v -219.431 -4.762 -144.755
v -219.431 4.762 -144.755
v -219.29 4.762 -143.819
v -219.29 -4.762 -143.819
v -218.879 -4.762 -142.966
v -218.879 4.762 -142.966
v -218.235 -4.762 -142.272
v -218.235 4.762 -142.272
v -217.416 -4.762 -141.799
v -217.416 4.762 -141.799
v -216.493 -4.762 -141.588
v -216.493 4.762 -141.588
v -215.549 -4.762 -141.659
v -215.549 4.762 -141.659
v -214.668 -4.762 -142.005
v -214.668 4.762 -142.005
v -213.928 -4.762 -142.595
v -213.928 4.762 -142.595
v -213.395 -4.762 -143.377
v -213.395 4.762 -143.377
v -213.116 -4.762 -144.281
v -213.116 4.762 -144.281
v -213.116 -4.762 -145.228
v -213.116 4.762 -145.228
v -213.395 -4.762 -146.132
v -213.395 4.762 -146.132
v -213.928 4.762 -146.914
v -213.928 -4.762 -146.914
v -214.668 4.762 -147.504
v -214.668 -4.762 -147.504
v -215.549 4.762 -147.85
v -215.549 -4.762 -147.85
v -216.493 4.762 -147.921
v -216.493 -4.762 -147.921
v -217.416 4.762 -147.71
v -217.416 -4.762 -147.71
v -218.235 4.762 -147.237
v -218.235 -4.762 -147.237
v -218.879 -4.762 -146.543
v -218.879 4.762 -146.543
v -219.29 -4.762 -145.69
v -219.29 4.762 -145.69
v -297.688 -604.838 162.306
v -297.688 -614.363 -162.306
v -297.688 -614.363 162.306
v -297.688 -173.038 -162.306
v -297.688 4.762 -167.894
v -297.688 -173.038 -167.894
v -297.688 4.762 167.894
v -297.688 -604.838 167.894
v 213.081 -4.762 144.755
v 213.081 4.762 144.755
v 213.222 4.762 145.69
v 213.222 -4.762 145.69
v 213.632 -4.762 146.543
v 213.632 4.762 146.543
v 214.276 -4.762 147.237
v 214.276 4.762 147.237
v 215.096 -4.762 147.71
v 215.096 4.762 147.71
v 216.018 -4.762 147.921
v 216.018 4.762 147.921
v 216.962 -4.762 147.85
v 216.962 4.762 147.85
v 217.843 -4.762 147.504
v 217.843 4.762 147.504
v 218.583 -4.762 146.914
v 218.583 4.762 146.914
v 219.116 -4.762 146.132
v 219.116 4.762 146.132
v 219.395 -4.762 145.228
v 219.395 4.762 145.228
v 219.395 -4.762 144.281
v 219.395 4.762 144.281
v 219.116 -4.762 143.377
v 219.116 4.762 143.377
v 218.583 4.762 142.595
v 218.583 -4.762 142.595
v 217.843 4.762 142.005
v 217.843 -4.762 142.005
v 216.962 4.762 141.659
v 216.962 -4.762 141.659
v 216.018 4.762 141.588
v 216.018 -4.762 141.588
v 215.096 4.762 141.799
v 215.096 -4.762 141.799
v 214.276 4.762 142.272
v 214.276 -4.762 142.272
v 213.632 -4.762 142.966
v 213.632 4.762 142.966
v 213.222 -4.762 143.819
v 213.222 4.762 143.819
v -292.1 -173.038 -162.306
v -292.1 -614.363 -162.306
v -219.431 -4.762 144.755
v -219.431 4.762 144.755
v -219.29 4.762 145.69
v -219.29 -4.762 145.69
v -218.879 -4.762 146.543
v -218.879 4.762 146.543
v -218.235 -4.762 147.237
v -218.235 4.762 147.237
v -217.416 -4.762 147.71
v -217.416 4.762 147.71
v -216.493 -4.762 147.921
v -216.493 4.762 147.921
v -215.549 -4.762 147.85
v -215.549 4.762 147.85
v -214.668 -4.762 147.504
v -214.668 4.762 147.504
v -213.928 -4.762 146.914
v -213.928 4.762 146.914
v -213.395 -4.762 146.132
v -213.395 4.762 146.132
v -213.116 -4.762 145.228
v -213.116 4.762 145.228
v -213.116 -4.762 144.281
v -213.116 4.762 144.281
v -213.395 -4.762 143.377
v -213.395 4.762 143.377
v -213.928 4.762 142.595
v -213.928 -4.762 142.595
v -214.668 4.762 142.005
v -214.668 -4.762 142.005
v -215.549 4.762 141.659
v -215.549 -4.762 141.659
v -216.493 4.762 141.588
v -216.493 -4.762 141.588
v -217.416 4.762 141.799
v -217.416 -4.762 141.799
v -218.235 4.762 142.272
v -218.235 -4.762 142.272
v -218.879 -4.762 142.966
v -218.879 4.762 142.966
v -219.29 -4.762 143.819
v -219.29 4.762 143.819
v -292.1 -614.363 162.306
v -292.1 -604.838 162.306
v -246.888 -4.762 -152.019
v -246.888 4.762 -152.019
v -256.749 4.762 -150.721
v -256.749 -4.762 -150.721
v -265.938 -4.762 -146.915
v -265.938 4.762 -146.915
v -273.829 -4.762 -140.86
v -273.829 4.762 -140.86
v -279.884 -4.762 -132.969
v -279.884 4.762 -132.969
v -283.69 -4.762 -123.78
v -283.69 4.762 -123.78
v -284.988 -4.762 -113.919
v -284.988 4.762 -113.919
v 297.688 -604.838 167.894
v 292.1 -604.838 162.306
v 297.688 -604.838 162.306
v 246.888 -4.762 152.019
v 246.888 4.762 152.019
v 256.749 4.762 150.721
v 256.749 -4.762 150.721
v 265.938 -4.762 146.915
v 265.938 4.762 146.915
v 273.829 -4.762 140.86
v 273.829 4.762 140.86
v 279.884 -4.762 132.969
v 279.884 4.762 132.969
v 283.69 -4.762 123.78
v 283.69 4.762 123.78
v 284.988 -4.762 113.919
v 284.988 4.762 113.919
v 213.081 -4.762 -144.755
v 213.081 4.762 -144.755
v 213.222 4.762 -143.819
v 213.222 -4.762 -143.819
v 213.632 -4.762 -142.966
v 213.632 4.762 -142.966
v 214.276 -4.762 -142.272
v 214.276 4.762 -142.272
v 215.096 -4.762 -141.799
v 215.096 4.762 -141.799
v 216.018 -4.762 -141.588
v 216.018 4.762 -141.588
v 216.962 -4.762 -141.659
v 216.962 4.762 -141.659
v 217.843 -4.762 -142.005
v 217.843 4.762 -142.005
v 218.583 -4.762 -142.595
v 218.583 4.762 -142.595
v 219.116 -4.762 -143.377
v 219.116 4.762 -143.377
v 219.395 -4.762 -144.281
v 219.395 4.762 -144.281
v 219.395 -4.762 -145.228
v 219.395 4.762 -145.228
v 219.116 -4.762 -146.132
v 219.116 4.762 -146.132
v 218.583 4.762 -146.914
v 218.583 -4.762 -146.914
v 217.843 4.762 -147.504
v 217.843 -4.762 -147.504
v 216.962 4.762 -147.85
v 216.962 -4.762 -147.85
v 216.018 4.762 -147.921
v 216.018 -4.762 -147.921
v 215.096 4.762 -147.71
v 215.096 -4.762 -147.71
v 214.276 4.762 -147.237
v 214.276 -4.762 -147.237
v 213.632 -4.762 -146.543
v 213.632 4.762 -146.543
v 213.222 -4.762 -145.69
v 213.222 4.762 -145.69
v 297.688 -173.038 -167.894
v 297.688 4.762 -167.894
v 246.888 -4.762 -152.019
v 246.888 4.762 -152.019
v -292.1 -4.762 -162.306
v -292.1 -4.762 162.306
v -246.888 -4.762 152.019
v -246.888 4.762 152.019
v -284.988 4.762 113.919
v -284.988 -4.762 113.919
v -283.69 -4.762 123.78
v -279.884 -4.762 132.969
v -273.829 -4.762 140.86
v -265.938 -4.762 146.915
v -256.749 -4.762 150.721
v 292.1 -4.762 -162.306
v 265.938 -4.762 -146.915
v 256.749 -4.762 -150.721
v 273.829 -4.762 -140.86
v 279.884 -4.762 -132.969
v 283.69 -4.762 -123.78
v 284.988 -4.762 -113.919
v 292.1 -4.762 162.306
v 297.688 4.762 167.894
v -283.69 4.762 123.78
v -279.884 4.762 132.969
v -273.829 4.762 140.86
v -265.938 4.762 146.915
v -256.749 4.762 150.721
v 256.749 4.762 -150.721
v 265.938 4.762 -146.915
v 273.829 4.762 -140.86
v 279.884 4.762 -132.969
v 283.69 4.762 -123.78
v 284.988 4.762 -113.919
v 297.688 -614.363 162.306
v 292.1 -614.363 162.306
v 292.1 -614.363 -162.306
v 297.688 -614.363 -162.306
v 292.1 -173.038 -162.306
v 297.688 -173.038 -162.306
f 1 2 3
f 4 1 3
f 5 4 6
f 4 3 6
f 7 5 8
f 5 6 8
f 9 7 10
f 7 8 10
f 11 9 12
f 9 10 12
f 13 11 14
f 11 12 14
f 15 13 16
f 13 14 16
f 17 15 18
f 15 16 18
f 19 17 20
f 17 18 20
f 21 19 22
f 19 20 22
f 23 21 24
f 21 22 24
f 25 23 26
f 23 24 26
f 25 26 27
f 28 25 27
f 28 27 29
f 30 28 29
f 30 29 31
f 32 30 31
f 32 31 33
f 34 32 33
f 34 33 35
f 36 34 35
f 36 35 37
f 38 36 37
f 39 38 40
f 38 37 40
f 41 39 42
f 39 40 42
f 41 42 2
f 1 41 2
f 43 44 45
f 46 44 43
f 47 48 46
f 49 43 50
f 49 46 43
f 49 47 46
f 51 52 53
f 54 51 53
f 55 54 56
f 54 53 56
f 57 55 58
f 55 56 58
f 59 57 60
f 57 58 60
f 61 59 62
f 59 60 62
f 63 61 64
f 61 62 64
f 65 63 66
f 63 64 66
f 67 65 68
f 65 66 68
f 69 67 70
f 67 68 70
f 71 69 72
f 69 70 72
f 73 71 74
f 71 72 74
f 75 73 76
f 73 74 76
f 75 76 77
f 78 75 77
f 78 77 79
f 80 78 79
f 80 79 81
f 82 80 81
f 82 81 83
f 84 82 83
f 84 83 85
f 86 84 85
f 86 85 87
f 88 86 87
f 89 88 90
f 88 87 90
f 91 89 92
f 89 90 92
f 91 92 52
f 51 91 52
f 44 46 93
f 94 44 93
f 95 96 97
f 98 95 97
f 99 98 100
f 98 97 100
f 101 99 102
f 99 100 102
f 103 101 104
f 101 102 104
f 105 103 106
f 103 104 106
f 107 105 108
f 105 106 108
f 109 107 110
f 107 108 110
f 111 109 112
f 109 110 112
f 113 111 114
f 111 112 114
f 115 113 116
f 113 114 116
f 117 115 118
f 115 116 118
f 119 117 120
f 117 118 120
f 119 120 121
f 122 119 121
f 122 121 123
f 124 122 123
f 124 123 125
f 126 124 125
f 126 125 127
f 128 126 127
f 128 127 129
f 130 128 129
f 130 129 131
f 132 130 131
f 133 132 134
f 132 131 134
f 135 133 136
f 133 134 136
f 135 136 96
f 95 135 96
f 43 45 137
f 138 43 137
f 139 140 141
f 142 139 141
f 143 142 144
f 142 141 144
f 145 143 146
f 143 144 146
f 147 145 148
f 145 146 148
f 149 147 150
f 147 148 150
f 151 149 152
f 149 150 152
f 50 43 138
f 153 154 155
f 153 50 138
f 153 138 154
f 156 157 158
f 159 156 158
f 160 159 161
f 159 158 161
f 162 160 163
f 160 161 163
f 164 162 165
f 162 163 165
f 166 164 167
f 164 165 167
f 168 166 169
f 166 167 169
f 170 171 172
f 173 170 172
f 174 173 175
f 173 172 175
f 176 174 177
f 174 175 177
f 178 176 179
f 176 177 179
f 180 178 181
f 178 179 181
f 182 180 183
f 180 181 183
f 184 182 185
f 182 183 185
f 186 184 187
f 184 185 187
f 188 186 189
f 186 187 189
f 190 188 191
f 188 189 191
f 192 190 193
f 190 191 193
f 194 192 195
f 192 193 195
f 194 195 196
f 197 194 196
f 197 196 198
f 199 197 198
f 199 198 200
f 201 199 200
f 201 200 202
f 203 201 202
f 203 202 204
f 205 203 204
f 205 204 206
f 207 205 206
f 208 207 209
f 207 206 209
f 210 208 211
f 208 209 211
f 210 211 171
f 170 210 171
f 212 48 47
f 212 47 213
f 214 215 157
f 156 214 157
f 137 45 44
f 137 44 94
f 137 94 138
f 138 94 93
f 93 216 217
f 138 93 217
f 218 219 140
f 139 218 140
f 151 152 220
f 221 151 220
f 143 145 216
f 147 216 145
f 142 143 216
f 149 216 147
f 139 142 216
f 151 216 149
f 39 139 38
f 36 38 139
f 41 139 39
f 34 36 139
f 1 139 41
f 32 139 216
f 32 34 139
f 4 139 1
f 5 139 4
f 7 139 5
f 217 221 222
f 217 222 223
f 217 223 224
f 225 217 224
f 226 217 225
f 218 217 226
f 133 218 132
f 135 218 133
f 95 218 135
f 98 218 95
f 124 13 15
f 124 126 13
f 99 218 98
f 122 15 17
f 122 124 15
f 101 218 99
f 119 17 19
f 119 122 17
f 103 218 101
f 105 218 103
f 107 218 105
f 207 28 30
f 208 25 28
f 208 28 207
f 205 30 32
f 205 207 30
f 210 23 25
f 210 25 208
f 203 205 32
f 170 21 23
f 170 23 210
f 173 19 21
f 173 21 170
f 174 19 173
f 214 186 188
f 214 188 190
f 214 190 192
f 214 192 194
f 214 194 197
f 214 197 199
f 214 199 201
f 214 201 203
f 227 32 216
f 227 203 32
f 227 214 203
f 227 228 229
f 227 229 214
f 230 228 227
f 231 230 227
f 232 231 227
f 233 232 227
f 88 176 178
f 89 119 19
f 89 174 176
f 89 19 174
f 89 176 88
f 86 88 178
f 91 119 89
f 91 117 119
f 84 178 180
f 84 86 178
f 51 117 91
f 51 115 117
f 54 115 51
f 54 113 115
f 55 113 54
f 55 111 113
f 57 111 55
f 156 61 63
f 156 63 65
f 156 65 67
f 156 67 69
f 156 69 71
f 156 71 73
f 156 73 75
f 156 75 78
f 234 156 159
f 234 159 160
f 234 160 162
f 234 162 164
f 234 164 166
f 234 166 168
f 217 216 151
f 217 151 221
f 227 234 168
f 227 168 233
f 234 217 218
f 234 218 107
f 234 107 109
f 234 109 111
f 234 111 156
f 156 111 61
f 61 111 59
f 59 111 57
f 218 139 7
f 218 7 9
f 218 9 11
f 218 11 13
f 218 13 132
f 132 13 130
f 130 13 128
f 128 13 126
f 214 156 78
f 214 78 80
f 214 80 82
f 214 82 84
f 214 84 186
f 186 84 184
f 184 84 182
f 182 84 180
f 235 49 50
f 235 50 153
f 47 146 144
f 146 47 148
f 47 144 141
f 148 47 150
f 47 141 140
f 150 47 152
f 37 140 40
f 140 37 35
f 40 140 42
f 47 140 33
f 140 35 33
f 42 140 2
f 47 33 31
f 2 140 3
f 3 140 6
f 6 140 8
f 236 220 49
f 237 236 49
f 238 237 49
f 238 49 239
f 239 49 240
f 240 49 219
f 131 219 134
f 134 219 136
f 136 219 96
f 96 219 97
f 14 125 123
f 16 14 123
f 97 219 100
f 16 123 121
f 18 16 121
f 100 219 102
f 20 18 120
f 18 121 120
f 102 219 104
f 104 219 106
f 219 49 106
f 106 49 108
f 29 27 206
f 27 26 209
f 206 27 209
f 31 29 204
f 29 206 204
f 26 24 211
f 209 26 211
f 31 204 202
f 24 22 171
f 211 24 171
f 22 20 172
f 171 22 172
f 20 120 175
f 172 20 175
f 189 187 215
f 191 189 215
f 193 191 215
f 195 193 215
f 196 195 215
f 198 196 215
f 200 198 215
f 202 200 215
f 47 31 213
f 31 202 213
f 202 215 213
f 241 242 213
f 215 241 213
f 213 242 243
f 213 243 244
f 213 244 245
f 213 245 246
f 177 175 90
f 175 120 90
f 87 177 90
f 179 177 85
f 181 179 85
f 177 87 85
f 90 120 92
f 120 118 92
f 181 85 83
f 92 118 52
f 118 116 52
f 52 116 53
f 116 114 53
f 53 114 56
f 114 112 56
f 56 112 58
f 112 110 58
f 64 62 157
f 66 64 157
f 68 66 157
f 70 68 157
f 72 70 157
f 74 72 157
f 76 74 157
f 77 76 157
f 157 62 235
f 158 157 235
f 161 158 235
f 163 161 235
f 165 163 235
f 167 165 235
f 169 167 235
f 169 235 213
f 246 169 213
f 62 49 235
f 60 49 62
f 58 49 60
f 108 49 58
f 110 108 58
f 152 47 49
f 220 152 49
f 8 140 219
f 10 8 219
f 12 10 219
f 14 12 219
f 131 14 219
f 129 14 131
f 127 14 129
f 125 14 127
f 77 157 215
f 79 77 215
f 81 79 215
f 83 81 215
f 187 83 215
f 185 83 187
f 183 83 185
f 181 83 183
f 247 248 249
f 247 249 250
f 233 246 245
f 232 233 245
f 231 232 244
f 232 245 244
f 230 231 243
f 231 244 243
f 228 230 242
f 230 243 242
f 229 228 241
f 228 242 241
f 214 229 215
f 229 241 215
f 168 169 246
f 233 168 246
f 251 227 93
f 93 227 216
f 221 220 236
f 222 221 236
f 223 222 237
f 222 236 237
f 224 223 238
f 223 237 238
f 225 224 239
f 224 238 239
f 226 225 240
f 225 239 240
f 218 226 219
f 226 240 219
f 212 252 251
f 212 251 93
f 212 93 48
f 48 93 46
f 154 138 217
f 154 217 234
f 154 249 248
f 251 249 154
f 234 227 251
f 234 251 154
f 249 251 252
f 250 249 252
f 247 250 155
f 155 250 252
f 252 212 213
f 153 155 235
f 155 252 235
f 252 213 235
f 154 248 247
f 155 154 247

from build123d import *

# Parameters (mm, degrees)
F0_W      = 595.376
F0_H      = 335.788
F1_DEPTH  = 4.7625
F2_W      = 5.588
F2_H      = 324.612
F3_DEPTH  = 609.6
F4_W      = 595.376
F4_H      = 5.588
F6_DEPTH  = 600.075
F7_W      = 595.376
F7_H      = 5.588
F8_DEPTH  = 177.8
F10_DEPTH = 9.525
F11_R     = 3.175
F12_DEPTH = 9.525


with BuildPart() as f1:
    # F0 (on Front) → F1 (new body, symmetric)
    with BuildSketch(Plane.XZ):
        Rectangle(F0_W, F0_H)
    extrude(amount=F1_DEPTH, both=True)

    # F2 (on face) → F3 (join)
    with BuildSketch(Plane.XZ.offset(4.7625)):
        with Locations((-294.894, 0)):
            Rectangle(F2_W, F2_H)
        with Locations((294.894, 0)):
            Rectangle(F2_W, F2_H)
    extrude(amount=F3_DEPTH)

    # F4 (on face) → F6 (join, through all)
    with BuildSketch(Plane.XZ.offset(4.7625)):
        with Locations((0, 165.1)):
            Rectangle(F4_W, F4_H)
    extrude(amount=F6_DEPTH)

    # F7 (on face) → F8 (join)
    with BuildSketch(Plane(origin=(0, 4.7625, 0), x_dir=(-1, 0, 0), z_dir=(0, 1, 0))):
        with Locations((0, -165.1)):
            Rectangle(F7_W, F7_H)
    extrude(amount=-F8_DEPTH)

    # F9 (on face) → F10 (cut, through all)
    with BuildSketch(Plane(origin=(0, 4.7625, 0), x_dir=(-1, 0, 0), z_dir=(0, 1, 0))):
        with BuildLine():
            ThreePointArc((-246.888, 152.019), (-273.8287683632, 140.8597683632), (-284.988, 113.919))
            Line((-284.988, 113.919), (-284.988, -113.919))
            ThreePointArc((-284.988, -113.919), (-273.8287683632, -140.8597683632), (-246.888, -152.019))
            Line((-246.888, -152.019), (-246.888, 152.019))
        make_face()
        with BuildLine():
            Line((284.988, -113.919), (284.988, 113.919))
            ThreePointArc((284.988, 113.919), (273.8287683632, 140.8597683632), (246.888, 152.019))
            Line((246.888, 152.019), (246.888, -152.019))
            ThreePointArc((246.888, -152.019), (273.8287683632, -140.8597683632), (284.988, -113.919))
        make_face()
    extrude(amount=-F10_DEPTH, mode=Mode.SUBTRACT)

    # F11 (on face) → F12 (cut, through all)
    with BuildSketch(Plane(origin=(0, 4.7625, 0), x_dir=(-1, 0, 0), z_dir=(0, 1, 0))):
        with Locations((-216.2556, 144.7546)):
            Circle(F11_R)
        with Locations((-216.2556, -144.7546)):
            Circle(F11_R)
        with Locations((216.2556, 144.7546)):
            Circle(F11_R)
        with Locations((216.2556, -144.7546)):
            Circle(F11_R)
    extrude(amount=-F12_DEPTH, mode=Mode.SUBTRACT)


solid = f1.part
